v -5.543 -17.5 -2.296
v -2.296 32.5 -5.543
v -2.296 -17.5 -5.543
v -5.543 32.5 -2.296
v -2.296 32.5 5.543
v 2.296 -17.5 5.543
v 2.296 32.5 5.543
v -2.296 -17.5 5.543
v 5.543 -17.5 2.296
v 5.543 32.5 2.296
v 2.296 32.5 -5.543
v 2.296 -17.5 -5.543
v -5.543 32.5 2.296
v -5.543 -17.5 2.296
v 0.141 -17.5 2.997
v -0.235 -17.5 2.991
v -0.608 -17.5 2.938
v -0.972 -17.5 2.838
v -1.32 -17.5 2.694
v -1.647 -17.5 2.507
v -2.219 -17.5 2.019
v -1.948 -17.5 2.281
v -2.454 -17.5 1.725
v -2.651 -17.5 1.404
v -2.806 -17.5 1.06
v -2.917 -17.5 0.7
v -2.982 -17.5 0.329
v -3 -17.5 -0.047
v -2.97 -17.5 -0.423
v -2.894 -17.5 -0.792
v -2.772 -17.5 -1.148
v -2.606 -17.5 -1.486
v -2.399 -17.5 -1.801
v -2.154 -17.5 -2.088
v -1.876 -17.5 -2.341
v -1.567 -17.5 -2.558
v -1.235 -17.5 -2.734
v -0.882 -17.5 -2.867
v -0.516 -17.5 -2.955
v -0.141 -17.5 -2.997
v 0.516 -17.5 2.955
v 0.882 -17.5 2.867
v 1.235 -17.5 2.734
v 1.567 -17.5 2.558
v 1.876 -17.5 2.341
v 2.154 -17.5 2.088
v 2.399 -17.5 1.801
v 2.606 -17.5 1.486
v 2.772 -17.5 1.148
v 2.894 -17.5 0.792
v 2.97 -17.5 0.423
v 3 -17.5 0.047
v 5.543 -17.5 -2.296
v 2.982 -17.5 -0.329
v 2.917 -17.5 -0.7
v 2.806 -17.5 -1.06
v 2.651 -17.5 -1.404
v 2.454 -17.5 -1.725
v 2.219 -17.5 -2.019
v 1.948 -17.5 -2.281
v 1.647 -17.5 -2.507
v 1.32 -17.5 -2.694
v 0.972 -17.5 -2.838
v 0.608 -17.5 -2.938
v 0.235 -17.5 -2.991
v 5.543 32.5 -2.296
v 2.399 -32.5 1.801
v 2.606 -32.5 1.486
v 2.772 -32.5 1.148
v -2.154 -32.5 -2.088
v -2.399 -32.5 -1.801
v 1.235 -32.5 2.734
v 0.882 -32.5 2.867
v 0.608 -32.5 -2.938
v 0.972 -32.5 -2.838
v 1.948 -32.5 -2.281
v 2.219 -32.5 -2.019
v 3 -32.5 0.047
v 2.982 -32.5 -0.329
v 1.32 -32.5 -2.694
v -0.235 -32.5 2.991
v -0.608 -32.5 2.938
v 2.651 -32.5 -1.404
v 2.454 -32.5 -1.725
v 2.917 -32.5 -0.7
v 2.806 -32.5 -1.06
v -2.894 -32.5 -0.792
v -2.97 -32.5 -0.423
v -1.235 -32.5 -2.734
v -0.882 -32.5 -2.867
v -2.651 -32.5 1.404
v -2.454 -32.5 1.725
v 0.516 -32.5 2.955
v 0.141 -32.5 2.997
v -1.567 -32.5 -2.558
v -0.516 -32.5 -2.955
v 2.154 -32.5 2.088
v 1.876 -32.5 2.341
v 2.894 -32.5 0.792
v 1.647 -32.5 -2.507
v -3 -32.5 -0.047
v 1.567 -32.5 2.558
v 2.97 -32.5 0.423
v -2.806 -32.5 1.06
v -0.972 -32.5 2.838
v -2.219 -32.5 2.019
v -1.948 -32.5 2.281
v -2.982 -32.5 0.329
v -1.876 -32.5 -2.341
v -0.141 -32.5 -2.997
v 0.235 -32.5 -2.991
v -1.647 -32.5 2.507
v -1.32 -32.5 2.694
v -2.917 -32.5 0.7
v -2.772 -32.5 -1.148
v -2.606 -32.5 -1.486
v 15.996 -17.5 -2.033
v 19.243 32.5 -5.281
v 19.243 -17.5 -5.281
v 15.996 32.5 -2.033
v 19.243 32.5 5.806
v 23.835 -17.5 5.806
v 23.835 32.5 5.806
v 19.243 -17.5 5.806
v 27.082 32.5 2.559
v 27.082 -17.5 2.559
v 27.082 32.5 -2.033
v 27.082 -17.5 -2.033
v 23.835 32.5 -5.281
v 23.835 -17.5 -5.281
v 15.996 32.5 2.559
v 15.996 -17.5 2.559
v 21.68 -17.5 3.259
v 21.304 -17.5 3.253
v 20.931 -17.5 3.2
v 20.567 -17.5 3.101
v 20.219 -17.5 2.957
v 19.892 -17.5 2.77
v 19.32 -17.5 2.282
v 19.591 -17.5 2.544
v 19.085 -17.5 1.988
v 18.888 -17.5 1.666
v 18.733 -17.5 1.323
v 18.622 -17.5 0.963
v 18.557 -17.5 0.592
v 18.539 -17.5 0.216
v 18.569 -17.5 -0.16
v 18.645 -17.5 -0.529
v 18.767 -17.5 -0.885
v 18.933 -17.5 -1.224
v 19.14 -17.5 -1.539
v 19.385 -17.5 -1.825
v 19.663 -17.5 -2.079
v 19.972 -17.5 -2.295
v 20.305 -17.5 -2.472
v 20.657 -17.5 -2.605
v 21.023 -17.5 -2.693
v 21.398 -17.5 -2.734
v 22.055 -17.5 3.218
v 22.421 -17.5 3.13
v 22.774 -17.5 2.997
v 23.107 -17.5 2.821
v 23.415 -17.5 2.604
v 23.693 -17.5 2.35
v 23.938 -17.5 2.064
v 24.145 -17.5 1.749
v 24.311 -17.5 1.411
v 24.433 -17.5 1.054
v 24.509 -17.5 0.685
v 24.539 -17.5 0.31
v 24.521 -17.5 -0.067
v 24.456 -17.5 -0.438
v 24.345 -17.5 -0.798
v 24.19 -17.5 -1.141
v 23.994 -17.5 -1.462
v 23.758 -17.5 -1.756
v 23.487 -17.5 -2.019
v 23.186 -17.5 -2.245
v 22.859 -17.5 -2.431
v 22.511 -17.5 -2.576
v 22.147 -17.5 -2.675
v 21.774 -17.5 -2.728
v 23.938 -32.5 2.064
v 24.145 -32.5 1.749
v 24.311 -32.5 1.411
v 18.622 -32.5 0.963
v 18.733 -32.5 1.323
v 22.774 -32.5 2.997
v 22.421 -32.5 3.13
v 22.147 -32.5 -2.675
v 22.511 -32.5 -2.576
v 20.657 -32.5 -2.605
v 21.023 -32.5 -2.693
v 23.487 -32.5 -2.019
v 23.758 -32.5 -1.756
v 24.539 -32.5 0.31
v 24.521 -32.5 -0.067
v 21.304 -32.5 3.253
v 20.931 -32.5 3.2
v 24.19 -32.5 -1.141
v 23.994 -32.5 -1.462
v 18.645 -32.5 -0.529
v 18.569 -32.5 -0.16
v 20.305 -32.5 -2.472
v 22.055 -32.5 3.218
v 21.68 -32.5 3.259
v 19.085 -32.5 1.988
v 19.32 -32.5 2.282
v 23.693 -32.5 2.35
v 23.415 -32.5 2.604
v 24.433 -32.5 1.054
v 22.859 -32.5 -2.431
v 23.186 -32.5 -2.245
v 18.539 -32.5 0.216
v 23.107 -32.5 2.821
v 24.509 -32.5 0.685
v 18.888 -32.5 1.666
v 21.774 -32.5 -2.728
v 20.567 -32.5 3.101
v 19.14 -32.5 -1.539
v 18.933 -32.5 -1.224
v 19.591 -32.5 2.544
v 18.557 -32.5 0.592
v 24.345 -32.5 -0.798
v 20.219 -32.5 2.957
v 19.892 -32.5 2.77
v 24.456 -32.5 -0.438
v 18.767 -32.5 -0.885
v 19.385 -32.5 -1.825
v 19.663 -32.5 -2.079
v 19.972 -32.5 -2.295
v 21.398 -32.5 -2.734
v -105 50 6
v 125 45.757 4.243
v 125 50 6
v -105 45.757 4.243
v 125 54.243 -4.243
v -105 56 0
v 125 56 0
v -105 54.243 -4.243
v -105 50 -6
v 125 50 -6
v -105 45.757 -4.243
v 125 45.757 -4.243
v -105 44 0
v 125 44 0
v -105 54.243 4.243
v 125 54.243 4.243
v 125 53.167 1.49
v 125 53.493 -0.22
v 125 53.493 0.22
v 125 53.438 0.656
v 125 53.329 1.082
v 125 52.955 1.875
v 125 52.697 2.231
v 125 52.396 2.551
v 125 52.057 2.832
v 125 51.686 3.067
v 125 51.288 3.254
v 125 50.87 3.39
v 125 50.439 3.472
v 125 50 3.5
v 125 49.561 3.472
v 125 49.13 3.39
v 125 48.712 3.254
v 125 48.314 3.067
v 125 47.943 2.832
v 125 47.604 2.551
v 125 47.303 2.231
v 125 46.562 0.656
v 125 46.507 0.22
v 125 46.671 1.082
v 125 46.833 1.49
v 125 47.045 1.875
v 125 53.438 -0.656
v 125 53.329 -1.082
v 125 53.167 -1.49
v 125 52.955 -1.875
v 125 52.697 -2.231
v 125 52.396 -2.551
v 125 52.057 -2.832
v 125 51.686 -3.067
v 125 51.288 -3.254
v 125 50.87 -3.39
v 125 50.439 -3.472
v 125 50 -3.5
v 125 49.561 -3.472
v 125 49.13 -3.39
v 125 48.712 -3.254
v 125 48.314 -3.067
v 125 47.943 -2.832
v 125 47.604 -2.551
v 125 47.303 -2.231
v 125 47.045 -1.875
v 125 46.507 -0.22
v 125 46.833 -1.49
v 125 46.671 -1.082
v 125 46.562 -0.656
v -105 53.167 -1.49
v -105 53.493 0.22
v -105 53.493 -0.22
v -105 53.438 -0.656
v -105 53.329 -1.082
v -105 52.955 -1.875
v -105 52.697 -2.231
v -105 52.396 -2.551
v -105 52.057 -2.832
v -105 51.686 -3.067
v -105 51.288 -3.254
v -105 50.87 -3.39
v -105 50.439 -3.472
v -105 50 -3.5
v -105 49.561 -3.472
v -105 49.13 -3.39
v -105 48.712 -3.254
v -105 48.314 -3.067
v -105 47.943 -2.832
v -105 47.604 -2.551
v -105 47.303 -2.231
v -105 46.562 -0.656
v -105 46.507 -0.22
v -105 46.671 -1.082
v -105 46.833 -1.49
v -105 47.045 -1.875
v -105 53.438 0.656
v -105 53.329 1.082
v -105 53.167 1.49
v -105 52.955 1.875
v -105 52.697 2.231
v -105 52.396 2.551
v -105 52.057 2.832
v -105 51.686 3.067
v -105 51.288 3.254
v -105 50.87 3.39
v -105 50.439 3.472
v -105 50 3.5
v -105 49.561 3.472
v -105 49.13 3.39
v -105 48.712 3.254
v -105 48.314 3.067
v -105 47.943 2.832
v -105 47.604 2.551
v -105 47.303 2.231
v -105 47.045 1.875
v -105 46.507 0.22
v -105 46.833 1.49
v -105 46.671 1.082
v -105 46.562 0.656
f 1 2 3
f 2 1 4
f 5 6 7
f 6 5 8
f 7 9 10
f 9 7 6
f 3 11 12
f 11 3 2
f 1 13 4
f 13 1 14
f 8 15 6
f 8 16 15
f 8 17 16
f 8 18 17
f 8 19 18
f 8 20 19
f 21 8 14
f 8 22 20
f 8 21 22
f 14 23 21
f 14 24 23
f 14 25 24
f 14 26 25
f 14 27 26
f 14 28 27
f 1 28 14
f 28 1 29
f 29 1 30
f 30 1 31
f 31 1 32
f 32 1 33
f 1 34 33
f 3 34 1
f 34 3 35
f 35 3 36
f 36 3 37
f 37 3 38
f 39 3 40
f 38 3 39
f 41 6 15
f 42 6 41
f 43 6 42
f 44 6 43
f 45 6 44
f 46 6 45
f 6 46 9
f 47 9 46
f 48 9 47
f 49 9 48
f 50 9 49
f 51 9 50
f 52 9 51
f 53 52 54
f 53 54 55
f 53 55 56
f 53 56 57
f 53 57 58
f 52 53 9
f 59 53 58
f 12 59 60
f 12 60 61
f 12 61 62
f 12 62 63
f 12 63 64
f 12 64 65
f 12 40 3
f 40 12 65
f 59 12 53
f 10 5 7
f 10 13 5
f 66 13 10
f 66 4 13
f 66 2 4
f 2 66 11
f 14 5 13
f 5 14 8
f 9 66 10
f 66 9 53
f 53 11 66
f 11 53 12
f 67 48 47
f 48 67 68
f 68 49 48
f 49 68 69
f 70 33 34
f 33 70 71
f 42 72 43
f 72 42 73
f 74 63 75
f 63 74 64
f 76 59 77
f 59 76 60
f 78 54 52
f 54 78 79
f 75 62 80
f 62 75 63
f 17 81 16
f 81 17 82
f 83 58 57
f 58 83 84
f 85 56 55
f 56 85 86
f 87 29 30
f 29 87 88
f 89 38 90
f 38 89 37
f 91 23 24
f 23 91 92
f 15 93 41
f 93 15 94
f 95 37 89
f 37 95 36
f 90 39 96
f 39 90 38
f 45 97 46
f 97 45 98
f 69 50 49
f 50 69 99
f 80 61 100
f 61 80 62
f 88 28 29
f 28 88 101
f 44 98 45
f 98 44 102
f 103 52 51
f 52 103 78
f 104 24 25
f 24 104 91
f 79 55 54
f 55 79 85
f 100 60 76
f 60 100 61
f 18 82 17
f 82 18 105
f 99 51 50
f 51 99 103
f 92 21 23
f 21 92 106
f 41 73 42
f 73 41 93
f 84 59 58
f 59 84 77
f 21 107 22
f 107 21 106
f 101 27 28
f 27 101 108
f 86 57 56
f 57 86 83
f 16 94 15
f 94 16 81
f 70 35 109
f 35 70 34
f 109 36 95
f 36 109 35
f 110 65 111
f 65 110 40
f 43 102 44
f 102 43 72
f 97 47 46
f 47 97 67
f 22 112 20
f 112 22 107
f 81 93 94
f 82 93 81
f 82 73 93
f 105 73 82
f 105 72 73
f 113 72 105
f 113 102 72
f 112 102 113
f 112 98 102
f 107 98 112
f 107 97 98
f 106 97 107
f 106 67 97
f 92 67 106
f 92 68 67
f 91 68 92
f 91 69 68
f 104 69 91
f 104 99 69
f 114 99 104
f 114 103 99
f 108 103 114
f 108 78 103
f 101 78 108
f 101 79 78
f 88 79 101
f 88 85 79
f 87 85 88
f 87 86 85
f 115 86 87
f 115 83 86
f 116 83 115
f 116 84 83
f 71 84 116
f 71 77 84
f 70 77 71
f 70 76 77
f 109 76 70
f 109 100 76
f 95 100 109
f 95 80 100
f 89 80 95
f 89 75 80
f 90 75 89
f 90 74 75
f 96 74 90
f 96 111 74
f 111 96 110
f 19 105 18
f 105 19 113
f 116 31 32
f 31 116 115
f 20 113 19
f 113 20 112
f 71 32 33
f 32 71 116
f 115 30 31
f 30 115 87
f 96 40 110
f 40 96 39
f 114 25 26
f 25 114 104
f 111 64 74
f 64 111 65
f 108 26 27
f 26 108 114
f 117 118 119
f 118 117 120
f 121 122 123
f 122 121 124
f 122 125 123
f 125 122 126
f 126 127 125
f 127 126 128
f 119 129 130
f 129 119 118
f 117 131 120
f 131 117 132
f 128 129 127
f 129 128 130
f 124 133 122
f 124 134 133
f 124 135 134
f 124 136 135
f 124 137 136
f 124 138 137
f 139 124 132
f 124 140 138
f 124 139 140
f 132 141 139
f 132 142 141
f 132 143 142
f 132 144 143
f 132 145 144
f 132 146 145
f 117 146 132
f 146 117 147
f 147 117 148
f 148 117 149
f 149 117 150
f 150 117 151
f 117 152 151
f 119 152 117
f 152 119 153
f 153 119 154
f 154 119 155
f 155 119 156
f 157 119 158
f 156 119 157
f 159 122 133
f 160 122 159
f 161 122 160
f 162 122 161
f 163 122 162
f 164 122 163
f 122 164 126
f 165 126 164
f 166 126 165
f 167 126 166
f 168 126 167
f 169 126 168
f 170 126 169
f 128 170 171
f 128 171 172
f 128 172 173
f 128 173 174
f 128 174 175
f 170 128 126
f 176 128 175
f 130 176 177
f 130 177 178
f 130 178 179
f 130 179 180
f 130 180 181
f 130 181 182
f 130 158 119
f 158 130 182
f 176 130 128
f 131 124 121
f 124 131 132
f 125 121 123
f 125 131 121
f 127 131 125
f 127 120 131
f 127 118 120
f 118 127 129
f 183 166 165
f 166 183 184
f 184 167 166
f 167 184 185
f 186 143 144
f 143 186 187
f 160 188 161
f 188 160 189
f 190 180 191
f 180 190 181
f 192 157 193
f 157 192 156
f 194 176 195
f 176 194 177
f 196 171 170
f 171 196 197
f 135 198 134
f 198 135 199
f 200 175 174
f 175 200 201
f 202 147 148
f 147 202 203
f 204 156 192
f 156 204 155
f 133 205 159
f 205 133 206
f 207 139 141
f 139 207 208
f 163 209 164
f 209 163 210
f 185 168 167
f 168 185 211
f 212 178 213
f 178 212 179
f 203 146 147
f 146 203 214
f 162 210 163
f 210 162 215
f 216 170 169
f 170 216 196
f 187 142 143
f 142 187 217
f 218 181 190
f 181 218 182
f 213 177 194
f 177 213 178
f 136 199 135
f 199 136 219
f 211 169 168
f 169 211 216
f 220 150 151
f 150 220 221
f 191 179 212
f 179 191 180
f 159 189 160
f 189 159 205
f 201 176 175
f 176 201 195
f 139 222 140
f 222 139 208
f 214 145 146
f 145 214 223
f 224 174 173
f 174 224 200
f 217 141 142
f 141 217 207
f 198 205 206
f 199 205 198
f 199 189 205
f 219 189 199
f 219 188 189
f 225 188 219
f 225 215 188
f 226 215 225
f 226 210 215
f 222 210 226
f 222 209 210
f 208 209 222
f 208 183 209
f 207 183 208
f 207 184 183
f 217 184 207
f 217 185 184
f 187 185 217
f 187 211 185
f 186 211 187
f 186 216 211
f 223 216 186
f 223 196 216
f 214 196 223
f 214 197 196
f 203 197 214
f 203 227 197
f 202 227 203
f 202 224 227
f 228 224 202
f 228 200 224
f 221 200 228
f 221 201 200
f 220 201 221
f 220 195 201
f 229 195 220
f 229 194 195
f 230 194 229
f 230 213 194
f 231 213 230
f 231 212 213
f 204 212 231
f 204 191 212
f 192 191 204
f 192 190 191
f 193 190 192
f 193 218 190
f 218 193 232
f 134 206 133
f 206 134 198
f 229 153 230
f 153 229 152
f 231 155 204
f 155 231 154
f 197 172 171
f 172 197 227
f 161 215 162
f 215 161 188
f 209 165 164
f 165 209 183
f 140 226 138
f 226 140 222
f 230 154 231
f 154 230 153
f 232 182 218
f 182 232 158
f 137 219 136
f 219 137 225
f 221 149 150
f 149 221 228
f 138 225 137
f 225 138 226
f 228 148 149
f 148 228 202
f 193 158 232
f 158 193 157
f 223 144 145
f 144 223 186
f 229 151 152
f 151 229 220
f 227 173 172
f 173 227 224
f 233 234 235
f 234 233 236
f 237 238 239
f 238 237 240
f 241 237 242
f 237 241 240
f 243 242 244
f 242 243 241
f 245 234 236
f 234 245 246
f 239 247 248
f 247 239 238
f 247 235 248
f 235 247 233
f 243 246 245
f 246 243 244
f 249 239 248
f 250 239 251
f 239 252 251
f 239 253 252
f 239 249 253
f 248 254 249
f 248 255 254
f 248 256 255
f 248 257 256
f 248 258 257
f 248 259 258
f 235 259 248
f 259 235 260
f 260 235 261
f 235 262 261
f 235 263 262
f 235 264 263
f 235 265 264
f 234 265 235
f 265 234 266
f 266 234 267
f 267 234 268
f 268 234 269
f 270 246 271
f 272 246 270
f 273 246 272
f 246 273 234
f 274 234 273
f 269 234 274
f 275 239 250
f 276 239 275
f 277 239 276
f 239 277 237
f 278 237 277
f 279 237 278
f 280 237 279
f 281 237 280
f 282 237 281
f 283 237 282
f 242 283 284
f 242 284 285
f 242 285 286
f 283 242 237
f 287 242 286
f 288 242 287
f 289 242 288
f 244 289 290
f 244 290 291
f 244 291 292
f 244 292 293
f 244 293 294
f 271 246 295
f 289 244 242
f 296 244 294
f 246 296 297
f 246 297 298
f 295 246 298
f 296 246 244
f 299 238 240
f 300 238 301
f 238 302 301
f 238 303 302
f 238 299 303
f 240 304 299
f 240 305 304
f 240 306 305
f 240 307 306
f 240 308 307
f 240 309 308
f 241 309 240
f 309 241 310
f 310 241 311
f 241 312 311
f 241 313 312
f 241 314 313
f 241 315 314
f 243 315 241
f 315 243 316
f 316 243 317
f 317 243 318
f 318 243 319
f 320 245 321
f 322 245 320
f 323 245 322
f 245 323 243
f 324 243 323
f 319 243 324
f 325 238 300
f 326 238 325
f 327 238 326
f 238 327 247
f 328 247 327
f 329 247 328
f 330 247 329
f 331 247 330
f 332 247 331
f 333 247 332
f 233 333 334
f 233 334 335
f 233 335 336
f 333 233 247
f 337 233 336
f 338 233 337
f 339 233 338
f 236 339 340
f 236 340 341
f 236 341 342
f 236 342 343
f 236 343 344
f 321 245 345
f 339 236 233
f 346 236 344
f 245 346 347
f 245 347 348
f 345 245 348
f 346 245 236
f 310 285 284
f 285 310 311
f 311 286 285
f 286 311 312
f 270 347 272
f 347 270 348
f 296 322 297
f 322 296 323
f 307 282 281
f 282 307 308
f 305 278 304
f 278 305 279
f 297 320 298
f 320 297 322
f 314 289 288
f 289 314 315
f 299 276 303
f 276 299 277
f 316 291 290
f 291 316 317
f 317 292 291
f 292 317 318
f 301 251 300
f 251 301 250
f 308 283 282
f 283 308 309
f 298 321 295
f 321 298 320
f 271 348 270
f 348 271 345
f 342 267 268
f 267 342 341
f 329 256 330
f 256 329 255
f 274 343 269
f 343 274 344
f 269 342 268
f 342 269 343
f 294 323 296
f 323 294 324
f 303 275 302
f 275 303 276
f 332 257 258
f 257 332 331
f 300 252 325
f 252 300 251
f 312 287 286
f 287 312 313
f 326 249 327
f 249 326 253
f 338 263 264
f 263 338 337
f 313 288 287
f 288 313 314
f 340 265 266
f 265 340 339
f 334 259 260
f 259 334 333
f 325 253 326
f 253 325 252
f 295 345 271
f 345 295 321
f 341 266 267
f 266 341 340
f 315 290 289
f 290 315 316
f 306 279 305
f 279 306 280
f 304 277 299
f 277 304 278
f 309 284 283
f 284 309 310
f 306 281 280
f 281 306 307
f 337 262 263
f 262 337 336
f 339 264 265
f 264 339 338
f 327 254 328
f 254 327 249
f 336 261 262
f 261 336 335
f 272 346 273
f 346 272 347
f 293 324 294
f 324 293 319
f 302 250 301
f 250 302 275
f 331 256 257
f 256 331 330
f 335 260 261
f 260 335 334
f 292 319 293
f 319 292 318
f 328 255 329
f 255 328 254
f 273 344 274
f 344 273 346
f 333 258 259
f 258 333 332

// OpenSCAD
////////// Magic Wand //////////////////////
////////////by: Mario The Magician////////////////////
/////////////www.mariothemagician.com/////////////////////


//////////Magic Wand Tips///////////////////////
tip_length = 50; // [15:50] 
///////////////////////////////////////////////

//////////////////Center of Wand/////////////////
wand_center = 230; // [30:230] 
////////////////////////////////////////////////



//Magic Wand tip
translate([0,32.5,0])
rotate([90,0,0]) {
rotate([0,0,22.5]) {

union() {
cylinder(r=6,tip_length,$fn=8); // outer end
translate([0,0,tip_length]) // keeps inner dowel attached while sizing
cylinder(r=3,h=15,$fn=50); // inner end
       
      }
translate([20,-8,0])
union() {
cylinder(r=6,tip_length,$fn=8); // outer end
translate([0,0,tip_length]) // keeps inner dowel attached while sizing
cylinder(r=3,h=15,$fn=50); // inner end
       
      }
  
   }

}


translate([0,50,0])
translate([-115,0,0])
rotate([0,90,0])

difference() {
translate([0,0,10])
cylinder(r=6,wand_center,$fn=8); // Center of Wand
cylinder(r=3.5,h=250,$fn=50); // inner hole

}
